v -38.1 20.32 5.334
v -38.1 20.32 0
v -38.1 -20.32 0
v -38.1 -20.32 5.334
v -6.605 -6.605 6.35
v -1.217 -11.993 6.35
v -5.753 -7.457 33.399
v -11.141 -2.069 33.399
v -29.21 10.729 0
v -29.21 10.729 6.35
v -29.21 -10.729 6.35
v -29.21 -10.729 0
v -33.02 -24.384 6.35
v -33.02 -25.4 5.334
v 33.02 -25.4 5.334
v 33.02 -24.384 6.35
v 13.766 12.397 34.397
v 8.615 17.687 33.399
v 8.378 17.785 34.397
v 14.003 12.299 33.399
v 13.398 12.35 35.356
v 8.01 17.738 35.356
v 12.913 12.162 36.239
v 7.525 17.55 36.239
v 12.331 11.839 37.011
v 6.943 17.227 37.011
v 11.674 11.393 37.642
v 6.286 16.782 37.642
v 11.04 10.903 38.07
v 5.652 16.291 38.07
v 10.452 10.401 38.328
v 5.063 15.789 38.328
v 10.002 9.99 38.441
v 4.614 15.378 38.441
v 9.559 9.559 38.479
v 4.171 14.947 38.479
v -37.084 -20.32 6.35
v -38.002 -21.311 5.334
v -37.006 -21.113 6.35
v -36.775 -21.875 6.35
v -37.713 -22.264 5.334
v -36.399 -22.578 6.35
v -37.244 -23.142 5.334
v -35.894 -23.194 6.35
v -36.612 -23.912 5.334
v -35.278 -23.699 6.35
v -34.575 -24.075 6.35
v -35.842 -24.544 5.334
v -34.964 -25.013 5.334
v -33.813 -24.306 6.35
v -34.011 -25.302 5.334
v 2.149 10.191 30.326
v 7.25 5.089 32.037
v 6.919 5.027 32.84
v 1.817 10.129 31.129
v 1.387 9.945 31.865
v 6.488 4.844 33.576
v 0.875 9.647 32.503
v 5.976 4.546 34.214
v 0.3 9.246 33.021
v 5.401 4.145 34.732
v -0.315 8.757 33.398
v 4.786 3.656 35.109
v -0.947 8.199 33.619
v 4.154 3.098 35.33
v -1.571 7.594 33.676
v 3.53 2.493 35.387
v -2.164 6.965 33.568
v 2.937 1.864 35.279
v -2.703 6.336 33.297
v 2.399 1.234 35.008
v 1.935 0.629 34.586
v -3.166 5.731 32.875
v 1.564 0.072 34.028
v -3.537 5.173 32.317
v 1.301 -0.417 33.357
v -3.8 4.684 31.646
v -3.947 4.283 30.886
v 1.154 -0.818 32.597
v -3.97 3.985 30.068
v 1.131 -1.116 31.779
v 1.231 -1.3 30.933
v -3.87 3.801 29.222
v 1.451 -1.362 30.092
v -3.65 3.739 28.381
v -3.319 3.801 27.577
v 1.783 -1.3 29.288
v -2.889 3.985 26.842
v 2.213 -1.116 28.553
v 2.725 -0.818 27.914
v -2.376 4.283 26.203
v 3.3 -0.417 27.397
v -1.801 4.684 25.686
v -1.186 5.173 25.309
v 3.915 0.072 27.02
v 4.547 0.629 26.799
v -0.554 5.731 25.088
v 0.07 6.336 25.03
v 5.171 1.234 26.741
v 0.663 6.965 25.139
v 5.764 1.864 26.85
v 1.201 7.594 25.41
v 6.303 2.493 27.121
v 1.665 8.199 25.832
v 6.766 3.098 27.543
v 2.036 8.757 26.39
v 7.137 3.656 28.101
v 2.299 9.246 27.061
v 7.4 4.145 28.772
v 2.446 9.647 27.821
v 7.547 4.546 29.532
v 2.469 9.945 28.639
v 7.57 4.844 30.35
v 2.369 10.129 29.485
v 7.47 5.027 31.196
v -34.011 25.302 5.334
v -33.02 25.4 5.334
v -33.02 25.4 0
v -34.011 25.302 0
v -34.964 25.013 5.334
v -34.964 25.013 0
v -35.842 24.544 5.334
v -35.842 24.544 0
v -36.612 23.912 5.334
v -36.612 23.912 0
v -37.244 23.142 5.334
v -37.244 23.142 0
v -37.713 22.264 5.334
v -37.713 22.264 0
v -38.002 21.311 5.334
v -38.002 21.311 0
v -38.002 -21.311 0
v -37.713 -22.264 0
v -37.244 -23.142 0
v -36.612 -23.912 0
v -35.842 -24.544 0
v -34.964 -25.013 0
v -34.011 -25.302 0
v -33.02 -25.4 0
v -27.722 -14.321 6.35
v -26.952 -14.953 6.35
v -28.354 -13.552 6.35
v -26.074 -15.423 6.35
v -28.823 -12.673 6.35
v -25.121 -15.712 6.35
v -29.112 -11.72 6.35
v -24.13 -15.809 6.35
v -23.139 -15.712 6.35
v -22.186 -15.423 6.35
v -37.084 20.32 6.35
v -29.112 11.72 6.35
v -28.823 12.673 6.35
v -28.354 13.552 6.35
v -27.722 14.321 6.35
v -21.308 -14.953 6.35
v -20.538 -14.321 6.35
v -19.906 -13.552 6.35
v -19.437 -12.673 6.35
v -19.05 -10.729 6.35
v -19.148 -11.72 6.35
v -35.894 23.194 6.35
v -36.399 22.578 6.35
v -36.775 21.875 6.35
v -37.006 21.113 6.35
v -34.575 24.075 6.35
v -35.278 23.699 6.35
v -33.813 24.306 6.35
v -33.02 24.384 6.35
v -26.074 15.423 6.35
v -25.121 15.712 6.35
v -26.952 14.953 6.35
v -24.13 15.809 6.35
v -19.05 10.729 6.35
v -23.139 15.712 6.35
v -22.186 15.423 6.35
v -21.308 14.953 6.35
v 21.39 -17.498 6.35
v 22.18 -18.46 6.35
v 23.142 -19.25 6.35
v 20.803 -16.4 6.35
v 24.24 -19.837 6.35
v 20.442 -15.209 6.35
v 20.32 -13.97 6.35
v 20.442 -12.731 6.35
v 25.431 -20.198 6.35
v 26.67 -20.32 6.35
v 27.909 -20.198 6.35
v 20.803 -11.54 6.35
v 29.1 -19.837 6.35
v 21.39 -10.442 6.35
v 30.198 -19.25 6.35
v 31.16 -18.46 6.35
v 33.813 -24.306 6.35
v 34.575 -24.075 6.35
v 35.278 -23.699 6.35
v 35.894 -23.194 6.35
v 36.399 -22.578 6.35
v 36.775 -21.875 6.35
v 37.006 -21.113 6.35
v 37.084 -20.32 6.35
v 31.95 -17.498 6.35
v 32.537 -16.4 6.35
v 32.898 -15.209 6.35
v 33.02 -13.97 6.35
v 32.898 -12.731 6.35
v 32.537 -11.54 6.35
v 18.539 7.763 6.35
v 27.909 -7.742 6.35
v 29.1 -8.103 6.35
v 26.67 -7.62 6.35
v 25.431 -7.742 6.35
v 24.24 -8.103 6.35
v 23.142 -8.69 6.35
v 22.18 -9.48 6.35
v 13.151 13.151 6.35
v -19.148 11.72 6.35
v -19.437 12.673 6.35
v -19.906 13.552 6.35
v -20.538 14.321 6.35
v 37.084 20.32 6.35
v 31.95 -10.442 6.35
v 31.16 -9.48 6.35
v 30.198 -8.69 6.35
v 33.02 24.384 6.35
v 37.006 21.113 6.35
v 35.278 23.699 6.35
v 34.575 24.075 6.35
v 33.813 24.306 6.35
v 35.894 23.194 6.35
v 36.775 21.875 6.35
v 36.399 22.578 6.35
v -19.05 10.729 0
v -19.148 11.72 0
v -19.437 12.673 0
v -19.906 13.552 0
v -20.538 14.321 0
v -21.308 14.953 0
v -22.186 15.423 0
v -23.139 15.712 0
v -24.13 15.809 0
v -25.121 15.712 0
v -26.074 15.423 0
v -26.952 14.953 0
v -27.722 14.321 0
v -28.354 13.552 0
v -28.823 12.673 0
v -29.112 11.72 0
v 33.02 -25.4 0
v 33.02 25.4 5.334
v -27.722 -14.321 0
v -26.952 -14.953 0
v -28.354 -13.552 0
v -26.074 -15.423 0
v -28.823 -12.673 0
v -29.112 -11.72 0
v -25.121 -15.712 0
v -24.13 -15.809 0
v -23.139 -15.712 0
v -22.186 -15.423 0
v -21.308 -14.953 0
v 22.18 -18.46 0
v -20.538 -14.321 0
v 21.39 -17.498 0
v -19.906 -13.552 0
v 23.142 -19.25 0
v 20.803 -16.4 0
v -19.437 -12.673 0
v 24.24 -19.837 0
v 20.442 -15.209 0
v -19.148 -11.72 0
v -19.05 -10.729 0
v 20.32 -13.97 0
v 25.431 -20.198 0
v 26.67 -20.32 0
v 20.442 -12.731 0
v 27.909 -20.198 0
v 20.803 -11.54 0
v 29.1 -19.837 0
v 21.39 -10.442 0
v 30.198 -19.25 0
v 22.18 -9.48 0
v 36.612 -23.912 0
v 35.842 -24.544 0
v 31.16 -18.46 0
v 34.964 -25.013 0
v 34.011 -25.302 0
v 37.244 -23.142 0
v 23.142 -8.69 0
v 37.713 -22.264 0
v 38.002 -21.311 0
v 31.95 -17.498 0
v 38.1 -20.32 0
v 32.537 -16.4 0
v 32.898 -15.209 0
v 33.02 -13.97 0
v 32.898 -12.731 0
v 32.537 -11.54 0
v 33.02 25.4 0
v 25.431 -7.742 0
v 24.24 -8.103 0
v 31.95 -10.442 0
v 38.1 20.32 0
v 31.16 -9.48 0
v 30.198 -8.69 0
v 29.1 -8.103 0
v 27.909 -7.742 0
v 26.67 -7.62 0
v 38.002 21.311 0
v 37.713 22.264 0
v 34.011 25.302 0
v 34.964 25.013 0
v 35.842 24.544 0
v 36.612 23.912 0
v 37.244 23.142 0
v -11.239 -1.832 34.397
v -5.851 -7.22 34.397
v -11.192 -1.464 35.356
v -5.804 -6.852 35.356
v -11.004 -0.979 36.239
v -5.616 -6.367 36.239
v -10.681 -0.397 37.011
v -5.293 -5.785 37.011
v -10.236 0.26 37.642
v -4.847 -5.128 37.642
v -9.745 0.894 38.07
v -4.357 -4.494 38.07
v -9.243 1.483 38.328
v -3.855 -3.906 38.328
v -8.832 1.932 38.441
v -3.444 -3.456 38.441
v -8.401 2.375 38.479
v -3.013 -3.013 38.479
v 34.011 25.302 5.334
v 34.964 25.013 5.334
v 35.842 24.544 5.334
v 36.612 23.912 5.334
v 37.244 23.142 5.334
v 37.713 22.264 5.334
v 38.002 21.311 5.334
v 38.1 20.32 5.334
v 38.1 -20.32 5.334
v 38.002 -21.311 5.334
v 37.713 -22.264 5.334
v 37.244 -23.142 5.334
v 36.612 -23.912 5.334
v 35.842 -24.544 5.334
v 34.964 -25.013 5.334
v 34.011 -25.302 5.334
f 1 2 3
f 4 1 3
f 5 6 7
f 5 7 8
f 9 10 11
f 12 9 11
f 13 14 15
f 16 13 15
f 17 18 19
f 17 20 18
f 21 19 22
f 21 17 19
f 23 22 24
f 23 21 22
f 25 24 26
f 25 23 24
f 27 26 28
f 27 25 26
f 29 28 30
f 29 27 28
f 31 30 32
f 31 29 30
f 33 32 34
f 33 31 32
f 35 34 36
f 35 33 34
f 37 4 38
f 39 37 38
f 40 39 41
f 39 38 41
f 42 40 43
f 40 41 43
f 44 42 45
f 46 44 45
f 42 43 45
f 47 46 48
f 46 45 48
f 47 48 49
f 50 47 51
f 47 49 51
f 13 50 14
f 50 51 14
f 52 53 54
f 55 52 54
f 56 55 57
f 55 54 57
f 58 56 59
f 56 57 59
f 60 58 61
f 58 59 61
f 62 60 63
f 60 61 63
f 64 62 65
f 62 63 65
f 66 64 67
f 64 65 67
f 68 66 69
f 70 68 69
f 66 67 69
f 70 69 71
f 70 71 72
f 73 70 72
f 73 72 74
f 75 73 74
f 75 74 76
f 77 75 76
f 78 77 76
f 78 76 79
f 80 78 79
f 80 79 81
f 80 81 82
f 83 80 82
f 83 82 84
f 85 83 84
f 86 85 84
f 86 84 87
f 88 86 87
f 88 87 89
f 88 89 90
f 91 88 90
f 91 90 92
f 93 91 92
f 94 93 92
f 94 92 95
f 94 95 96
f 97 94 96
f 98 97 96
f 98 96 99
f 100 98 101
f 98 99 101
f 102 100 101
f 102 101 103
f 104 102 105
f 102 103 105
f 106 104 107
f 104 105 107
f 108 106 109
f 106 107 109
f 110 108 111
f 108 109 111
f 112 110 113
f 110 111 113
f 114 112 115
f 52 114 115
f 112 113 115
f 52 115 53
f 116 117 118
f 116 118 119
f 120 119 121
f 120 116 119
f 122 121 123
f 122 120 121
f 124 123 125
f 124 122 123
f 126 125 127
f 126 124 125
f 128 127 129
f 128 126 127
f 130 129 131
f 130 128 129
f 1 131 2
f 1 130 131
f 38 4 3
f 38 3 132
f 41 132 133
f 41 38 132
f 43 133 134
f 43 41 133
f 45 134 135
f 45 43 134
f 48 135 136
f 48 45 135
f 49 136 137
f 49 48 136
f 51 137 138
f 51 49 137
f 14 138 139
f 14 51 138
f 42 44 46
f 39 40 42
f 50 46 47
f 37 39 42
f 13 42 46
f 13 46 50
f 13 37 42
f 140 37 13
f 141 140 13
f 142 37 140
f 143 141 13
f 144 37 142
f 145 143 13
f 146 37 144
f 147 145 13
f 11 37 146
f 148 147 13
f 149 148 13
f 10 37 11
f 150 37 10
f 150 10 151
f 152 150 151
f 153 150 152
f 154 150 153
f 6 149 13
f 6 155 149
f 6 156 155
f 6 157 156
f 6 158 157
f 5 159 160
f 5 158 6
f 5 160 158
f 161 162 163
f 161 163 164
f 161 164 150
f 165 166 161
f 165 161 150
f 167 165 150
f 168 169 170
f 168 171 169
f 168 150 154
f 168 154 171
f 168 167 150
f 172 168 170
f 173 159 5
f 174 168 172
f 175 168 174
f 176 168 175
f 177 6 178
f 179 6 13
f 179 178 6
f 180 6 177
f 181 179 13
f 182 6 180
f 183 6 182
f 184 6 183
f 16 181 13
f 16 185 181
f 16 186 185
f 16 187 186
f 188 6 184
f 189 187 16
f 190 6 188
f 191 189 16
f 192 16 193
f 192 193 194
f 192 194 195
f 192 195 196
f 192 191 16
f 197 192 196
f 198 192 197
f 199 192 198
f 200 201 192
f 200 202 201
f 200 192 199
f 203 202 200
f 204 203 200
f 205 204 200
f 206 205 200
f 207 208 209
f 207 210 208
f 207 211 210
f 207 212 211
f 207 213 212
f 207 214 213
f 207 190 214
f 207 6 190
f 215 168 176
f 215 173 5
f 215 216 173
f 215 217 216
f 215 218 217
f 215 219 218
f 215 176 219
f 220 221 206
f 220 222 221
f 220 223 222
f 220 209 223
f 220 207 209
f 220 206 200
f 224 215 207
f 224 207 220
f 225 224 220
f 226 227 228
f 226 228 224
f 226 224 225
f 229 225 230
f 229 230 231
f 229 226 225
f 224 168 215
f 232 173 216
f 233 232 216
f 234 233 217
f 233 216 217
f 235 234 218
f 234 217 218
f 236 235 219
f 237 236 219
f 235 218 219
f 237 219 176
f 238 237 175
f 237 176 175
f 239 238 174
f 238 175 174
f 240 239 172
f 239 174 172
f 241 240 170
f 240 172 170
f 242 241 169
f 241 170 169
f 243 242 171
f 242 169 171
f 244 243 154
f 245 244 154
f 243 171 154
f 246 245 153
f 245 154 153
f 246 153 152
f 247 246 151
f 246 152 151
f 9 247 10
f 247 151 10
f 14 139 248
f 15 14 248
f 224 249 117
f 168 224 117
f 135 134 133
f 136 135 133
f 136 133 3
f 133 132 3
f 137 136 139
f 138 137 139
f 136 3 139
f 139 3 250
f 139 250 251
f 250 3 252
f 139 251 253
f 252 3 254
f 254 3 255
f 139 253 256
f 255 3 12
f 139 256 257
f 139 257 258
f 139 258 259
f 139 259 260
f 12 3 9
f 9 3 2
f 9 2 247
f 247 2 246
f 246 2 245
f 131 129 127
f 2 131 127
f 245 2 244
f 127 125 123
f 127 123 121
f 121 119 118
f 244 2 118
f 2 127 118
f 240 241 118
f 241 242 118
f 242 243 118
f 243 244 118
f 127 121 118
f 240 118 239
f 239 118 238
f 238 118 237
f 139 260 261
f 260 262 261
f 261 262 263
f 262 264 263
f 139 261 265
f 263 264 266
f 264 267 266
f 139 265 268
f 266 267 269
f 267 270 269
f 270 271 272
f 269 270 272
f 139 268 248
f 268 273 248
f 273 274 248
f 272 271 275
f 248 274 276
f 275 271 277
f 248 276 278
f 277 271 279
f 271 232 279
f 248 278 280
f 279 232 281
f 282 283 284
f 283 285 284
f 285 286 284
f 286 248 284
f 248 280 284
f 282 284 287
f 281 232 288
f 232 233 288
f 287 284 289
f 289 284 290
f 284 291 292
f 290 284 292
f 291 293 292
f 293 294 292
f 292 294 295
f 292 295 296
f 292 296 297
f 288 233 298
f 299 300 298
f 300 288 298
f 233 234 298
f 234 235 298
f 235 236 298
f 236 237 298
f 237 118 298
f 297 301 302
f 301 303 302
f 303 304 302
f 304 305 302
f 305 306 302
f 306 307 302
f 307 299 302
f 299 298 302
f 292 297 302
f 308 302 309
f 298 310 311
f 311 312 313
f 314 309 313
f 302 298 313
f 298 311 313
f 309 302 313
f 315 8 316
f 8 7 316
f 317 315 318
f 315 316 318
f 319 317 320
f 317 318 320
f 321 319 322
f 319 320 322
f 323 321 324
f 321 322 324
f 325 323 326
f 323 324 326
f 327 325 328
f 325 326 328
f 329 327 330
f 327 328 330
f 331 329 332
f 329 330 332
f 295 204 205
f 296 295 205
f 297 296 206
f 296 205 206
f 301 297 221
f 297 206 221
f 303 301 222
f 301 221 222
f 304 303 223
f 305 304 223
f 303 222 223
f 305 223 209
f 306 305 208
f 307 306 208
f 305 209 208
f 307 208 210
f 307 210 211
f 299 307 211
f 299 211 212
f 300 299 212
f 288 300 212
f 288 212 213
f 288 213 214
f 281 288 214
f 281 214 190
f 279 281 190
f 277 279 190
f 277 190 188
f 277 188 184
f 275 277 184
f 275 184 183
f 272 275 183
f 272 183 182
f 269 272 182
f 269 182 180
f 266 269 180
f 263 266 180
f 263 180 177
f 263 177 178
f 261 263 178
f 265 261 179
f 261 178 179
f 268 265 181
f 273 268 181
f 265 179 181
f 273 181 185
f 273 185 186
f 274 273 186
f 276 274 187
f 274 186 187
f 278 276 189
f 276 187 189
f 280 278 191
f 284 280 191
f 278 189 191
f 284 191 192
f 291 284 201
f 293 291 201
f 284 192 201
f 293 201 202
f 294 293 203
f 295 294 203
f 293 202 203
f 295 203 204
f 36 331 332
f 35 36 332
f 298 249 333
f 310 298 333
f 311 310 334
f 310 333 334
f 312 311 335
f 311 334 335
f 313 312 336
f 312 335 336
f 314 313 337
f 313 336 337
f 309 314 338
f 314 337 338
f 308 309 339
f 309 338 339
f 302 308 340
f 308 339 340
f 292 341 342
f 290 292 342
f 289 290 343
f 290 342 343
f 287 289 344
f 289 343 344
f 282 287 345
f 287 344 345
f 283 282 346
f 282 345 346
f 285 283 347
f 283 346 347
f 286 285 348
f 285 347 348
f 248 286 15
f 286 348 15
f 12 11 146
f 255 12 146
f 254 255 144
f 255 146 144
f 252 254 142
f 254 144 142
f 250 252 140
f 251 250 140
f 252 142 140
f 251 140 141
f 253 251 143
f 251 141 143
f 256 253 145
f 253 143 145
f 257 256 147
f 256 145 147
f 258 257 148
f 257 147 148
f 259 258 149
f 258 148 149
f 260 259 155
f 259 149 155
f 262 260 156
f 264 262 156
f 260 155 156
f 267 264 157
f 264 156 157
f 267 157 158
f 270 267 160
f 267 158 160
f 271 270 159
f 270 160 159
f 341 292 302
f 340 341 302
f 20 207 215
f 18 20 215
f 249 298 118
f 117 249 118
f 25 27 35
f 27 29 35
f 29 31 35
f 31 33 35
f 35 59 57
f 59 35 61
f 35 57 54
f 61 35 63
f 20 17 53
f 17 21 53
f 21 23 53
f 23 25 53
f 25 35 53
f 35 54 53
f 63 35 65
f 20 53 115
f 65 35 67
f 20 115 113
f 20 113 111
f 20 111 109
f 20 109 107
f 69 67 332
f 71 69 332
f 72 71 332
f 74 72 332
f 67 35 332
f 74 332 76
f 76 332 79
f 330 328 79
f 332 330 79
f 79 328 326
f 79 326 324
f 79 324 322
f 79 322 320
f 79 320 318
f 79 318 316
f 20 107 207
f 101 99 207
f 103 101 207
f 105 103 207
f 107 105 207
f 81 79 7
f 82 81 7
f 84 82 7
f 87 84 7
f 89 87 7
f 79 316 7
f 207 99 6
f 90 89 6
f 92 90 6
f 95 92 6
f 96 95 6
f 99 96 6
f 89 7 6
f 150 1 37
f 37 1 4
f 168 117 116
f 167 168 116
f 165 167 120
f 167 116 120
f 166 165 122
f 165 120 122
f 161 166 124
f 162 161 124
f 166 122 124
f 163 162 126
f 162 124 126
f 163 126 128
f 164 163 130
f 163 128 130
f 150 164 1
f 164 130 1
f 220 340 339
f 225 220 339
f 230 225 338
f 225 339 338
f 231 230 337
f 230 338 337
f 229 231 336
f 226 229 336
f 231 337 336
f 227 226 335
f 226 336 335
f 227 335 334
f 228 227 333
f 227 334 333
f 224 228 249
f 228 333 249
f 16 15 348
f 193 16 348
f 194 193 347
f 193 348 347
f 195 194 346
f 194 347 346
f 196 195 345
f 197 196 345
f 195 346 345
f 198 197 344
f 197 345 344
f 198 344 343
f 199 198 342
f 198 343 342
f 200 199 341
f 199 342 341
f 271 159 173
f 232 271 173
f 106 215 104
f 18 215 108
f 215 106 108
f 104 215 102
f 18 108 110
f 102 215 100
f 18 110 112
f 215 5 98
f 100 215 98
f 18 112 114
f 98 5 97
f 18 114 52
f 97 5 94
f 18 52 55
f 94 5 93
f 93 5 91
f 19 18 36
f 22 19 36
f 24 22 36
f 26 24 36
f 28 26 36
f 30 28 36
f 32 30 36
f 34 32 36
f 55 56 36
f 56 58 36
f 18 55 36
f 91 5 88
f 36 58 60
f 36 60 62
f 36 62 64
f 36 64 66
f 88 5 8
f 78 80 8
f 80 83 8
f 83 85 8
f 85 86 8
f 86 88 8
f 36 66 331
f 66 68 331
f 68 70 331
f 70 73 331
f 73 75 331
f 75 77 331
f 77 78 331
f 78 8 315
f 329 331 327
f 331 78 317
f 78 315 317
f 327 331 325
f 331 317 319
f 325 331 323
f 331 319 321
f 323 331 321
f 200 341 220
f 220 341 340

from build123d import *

# Parameters (mm, degrees)
F1_DEPTH = 6.35
F2_R     = 6.35
F3_DEPTH = 25.4
F6_START = 35.56
F6_DEPTH = 27.94
F7_R     = 5.08
F8_R     = 4.445
F9_DEPTH = 25.4
F10_R    = 5.08
F11_SIZE = 1.016


with BuildPart() as f1:
    # F0 (on Top) → F1 (new body)
    with BuildSketch(Plane.XY):
        Polygon((38.1, 25.4), (0, 25.4), (-38.1, 25.4), (-38.1, 0), (-38.1, -25.4), (0, -25.4), (38.1, -25.4), (38.1, 0), align=None)
    extrude(amount=F1_DEPTH)

    # F2 (on face) → F3 (cut)
    with BuildSketch(Plane.XY.offset(6.35)):
        with BuildLine():
            Line((-19.05, 0), (-19.05, 10.7293000911))
            ThreePointArc((-19.05, 10.7293000911), (-24.13, 15.8093000911), (-29.21, 10.7293000911))
            Line((-29.21, 10.7293000911), (-29.21, 0))
            Line((-29.21, 0), (-29.21, -10.7293000911))
            ThreePointArc((-29.21, -10.7293000911), (-24.13, -15.8093000911), (-19.05, -10.7293000911))
            Line((-19.05, -10.7293000911), (-19.05, 0))
        make_face()
        with Locations((26.67, -13.97)):
            Circle(F2_R)
    extrude(amount=-F3_DEPTH, mode=Mode.SUBTRACT)

    # F5 (on face) → F6 (join)
    with BuildSketch(Plane(origin=(-31.75, -31.75, 0), x_dir=(-0.7071067812, 0.7071067812, 0), z_dir=(0.7071067812, 0.7071067812, 0)).offset(F6_START)):
        Polygon((-7.62, 6.35), (0, 6.35), (7.62, 38.4787410273), (0, 38.4787410273), align=None)
    extrude(amount=F6_DEPTH)

    # F7
    f7_edges = [f1.edges().sort_by_distance(p)[0] for p in [
        (-9.29936, -3.911206, 38.478741),
        (10.457204, 15.845357, 38.478741),
    ]]
    fillet(f7_edges, radius=F7_R)

    # F8 (on face) → F9 (cut)
    with BuildSketch(Plane(origin=(6.1094258432, -6.1094258432, 2.0491637233), x_dir=(0.6523063877, 0.7256908563, 0.2187902138), z_dir=(0.6880209162, -0.6880209162, 0.2307692308))):
        with Locations((10.9869780004, 28.0684145883)):
            Circle(F8_R)
    extrude(amount=-F9_DEPTH, mode=Mode.SUBTRACT)

    # F10
    f10_edges = [f1.edges().sort_by_distance(p)[0] for p in [
        (38.1, -25.4, 3.175),
        (38.1, 25.4, 3.175),
        (-38.1, -25.4, 3.175),
        (-38.1, 25.4, 3.175),
    ]]
    fillet(f10_edges, radius=F10_R)

    # F11
    f11_edges = [f1.edges().sort_by_distance(p)[0] for p in [
        (0, -25.4, 6.35),
        (38.1, 0, 6.35),
        (36.612102, -23.912102, 6.35),
        (36.612102, 23.912102, 6.35),
        (0, 25.4, 6.35),
        (-36.612102, 23.912102, 6.35),
        (-38.1, 0, 6.35),
        (-36.612102, -23.912102, 6.35),
    ]]
    chamfer(f11_edges, length=F11_SIZE)


solid = f1.part
